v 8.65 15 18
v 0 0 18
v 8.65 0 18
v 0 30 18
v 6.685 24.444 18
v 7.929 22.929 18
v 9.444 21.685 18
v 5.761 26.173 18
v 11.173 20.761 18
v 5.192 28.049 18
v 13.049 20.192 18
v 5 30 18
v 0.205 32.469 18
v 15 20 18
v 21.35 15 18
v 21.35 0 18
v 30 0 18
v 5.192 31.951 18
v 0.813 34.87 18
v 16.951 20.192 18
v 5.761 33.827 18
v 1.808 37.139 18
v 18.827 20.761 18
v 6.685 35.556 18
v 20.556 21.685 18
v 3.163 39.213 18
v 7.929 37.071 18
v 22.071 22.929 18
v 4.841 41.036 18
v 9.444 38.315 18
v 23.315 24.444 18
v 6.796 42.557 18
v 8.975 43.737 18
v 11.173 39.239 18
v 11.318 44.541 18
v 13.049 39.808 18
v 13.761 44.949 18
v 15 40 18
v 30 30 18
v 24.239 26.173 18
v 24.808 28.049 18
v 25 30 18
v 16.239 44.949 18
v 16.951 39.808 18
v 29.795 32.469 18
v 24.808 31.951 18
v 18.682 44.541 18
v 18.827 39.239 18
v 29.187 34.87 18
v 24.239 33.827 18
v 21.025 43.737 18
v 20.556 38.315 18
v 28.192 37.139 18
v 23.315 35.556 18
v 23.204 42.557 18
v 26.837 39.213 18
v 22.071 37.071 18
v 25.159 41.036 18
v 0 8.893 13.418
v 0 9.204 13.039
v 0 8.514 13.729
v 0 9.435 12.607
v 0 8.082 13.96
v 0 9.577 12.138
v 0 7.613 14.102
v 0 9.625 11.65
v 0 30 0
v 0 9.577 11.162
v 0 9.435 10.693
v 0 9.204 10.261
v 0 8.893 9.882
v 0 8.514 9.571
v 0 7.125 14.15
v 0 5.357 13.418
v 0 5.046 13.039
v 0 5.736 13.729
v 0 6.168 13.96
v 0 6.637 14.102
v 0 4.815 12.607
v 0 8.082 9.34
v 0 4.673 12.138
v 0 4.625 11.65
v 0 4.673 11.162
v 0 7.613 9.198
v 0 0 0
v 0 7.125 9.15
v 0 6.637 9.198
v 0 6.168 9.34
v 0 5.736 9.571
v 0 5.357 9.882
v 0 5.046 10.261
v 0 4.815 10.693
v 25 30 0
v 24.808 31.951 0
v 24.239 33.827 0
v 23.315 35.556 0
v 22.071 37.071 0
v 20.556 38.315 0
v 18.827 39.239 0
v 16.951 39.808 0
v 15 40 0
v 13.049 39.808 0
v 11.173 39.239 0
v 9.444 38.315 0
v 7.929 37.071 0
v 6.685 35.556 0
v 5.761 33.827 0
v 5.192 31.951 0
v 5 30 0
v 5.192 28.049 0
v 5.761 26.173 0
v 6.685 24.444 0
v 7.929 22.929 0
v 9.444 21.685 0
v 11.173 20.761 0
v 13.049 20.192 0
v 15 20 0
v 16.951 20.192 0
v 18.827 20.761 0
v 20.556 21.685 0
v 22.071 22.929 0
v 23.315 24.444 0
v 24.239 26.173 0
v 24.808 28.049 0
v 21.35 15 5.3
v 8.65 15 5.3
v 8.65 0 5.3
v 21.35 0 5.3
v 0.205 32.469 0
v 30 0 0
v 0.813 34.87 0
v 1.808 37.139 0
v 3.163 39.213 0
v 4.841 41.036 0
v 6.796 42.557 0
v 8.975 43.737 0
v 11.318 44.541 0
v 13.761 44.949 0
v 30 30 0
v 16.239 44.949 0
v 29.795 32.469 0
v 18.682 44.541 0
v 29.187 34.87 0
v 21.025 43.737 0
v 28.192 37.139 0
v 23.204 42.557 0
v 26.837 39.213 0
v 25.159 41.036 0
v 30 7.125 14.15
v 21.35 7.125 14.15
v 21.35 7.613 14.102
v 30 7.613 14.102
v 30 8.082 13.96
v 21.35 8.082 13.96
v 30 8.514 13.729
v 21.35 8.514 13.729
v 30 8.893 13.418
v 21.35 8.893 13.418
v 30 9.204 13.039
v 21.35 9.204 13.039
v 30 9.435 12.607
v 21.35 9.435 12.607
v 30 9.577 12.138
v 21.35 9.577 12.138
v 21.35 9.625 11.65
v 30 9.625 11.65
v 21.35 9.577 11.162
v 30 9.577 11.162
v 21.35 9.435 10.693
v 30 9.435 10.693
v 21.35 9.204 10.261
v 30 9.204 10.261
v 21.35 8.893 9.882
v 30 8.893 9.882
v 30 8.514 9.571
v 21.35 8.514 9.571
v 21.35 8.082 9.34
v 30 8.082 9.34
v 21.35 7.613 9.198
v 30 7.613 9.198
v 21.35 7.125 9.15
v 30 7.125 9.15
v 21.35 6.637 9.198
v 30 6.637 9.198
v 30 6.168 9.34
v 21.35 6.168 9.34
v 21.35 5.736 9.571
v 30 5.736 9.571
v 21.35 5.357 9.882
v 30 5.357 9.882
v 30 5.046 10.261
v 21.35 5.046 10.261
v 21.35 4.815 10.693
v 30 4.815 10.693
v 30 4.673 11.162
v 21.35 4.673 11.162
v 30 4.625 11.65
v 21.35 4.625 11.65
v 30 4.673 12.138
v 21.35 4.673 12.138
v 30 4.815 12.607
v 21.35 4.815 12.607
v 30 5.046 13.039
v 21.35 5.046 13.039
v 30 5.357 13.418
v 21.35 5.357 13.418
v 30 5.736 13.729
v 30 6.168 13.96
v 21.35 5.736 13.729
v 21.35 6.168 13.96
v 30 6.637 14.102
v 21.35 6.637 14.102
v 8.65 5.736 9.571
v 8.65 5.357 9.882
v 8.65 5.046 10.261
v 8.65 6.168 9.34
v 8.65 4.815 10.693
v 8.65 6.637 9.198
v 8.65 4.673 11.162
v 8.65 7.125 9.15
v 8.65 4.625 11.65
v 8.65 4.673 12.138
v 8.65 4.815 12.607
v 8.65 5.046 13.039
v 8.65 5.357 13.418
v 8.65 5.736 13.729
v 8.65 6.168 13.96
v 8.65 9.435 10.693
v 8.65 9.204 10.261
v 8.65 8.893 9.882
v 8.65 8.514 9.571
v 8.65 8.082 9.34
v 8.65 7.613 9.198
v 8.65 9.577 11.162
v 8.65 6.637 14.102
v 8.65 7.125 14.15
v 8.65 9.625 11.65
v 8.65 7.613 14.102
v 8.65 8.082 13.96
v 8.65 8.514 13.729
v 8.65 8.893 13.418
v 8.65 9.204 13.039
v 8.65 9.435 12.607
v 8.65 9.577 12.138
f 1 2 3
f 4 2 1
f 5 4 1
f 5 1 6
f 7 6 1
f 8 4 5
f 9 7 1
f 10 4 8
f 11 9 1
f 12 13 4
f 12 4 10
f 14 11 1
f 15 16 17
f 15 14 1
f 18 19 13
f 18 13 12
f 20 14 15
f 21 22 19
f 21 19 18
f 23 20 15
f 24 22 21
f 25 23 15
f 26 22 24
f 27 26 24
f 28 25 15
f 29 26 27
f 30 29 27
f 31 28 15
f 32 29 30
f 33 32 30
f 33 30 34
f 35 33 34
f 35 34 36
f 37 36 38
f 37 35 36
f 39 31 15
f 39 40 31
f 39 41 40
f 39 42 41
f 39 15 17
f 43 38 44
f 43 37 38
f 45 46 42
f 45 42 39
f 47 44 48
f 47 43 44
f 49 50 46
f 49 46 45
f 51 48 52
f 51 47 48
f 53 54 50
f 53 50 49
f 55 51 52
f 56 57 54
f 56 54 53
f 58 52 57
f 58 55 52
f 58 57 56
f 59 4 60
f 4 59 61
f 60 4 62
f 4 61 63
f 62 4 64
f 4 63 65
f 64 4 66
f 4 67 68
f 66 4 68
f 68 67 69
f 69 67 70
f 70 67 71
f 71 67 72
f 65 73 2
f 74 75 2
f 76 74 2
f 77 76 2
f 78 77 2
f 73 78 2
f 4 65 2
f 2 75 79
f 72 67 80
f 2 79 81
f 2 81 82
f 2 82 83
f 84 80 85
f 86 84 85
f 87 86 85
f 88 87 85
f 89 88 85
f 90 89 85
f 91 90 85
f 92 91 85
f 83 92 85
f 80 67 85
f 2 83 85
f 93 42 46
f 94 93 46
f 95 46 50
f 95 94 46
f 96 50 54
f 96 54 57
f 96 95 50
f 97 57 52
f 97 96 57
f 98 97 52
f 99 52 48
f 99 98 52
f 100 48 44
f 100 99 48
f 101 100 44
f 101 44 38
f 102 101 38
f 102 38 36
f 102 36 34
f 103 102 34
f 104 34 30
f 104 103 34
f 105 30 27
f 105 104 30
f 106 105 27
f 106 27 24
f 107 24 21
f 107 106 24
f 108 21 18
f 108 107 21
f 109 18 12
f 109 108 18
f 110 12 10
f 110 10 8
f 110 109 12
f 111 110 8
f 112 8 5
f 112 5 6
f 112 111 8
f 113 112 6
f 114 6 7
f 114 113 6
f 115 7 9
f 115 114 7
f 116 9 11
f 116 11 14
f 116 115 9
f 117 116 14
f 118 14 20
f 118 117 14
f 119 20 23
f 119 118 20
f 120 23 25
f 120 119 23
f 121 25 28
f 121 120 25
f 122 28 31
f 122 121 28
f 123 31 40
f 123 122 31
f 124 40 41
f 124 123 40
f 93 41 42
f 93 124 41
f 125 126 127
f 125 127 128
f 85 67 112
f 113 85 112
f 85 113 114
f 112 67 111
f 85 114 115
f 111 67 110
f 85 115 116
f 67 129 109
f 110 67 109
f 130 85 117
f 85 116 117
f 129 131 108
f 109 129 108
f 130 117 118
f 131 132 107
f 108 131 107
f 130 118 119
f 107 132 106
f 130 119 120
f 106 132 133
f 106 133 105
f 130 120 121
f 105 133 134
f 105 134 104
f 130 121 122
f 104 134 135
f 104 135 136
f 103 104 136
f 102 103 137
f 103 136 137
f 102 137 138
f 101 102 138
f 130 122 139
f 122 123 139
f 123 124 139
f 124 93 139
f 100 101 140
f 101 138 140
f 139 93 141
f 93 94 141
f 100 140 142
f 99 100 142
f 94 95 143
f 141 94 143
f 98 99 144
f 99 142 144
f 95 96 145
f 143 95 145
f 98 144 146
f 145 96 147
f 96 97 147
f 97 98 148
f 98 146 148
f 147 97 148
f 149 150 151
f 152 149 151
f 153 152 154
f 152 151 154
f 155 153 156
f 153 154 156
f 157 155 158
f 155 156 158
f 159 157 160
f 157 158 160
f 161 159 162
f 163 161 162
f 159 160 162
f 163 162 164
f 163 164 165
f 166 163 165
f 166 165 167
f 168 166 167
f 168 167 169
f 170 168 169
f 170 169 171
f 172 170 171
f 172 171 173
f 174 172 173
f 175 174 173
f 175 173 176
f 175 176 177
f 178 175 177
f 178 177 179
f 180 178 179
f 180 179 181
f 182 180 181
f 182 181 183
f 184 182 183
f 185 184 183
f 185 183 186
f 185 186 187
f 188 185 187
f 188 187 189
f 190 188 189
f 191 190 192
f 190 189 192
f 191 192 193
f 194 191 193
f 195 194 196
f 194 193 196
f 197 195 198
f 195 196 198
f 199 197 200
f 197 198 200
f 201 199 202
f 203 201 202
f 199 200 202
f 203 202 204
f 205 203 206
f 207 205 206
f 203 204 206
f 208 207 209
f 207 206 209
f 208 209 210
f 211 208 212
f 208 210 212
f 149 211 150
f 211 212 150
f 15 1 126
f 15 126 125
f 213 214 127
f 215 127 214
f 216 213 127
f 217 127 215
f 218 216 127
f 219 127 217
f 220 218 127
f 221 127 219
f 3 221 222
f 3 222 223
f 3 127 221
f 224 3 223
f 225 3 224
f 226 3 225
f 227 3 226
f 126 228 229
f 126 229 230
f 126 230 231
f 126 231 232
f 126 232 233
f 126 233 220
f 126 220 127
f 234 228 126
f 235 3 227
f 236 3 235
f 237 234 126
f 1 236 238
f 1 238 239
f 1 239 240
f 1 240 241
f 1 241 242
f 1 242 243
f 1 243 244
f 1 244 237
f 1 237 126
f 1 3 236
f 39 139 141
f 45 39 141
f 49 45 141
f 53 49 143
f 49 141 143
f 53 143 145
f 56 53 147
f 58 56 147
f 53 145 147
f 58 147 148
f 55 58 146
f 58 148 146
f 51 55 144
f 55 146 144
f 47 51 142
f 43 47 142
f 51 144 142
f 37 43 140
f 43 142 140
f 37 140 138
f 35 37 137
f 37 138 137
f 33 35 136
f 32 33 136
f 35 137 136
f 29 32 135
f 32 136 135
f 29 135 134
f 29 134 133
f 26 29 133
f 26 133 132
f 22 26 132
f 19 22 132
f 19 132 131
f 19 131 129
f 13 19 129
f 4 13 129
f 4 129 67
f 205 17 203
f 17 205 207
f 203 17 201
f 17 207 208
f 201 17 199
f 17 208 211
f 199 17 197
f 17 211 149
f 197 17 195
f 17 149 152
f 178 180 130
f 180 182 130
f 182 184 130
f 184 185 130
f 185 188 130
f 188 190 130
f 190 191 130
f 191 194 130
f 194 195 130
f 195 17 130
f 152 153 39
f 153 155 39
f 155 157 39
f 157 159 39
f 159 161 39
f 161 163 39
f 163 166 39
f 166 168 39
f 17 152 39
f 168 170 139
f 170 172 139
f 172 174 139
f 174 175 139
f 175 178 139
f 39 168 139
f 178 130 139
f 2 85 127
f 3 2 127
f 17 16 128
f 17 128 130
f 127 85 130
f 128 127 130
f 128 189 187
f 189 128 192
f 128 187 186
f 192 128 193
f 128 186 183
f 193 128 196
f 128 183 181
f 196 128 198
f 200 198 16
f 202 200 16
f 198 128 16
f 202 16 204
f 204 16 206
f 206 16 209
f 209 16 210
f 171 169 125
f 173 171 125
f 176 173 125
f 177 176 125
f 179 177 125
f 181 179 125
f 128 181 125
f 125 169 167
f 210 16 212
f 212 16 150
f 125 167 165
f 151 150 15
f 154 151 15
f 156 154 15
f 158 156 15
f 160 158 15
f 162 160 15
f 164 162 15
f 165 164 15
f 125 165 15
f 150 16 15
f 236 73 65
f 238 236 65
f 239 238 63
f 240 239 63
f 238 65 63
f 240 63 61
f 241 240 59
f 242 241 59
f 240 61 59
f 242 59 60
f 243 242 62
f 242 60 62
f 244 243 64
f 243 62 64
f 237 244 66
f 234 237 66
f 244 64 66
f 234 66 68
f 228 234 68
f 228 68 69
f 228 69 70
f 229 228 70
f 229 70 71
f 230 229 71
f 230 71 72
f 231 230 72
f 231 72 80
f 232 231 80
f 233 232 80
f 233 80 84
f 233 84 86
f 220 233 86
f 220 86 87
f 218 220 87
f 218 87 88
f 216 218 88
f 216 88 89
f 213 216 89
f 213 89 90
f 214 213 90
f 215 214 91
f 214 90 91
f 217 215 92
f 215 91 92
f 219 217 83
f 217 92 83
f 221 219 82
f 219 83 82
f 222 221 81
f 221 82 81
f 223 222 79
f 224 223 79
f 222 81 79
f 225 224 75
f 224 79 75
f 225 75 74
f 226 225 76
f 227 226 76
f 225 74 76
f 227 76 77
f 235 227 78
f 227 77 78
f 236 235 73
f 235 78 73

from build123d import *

# Parameters (mm, degrees)
ESQUISSE1_R             = 10
BOSS_EXTRU_1_DEPTH      = 18
ESQUISSE2_W             = 12.7
ESQUISSE2_H             = 15
ENL_V_MAT_EXTRU_1_DEPTH = 12.7
ESQUISSE3_R             = 2.5
ENL_V_MAT_EXTRU_2_DEPTH = 31


with BuildPart() as part:
    # Esquisse1 → Boss.-Extru.1 (new body)
    with BuildSketch(Plane.XY):
        with BuildLine():
            Line((0, 0), (30, 0))
            Line((30, 0), (30, 30))
            ThreePointArc((30, 30), (15, 45), (0, 30))
            Line((0, 30), (0, 0))
        make_face()
        with Locations((15, 30)):
            Circle(ESQUISSE1_R, mode=Mode.SUBTRACT)
    extrude(amount=BOSS_EXTRU_1_DEPTH)

    # Esquisse2 → Enlèv. mat.-Extru.1 (cut)
    with BuildSketch(Plane.XY.offset(18)):
        with Locations((15, 7.5)):
            Rectangle(ESQUISSE2_W, ESQUISSE2_H)
    extrude(amount=-ENL_V_MAT_EXTRU_1_DEPTH, mode=Mode.SUBTRACT)

    # Esquisse3 → Enlèv. mat.-Extru.2 (cut, through all)
    with BuildSketch(Plane.ZY):
        with Locations((11.65, 7.125)):
            Circle(ESQUISSE3_R)
    extrude(amount=-ENL_V_MAT_EXTRU_2_DEPTH, mode=Mode.SUBTRACT)


solid = part.part
